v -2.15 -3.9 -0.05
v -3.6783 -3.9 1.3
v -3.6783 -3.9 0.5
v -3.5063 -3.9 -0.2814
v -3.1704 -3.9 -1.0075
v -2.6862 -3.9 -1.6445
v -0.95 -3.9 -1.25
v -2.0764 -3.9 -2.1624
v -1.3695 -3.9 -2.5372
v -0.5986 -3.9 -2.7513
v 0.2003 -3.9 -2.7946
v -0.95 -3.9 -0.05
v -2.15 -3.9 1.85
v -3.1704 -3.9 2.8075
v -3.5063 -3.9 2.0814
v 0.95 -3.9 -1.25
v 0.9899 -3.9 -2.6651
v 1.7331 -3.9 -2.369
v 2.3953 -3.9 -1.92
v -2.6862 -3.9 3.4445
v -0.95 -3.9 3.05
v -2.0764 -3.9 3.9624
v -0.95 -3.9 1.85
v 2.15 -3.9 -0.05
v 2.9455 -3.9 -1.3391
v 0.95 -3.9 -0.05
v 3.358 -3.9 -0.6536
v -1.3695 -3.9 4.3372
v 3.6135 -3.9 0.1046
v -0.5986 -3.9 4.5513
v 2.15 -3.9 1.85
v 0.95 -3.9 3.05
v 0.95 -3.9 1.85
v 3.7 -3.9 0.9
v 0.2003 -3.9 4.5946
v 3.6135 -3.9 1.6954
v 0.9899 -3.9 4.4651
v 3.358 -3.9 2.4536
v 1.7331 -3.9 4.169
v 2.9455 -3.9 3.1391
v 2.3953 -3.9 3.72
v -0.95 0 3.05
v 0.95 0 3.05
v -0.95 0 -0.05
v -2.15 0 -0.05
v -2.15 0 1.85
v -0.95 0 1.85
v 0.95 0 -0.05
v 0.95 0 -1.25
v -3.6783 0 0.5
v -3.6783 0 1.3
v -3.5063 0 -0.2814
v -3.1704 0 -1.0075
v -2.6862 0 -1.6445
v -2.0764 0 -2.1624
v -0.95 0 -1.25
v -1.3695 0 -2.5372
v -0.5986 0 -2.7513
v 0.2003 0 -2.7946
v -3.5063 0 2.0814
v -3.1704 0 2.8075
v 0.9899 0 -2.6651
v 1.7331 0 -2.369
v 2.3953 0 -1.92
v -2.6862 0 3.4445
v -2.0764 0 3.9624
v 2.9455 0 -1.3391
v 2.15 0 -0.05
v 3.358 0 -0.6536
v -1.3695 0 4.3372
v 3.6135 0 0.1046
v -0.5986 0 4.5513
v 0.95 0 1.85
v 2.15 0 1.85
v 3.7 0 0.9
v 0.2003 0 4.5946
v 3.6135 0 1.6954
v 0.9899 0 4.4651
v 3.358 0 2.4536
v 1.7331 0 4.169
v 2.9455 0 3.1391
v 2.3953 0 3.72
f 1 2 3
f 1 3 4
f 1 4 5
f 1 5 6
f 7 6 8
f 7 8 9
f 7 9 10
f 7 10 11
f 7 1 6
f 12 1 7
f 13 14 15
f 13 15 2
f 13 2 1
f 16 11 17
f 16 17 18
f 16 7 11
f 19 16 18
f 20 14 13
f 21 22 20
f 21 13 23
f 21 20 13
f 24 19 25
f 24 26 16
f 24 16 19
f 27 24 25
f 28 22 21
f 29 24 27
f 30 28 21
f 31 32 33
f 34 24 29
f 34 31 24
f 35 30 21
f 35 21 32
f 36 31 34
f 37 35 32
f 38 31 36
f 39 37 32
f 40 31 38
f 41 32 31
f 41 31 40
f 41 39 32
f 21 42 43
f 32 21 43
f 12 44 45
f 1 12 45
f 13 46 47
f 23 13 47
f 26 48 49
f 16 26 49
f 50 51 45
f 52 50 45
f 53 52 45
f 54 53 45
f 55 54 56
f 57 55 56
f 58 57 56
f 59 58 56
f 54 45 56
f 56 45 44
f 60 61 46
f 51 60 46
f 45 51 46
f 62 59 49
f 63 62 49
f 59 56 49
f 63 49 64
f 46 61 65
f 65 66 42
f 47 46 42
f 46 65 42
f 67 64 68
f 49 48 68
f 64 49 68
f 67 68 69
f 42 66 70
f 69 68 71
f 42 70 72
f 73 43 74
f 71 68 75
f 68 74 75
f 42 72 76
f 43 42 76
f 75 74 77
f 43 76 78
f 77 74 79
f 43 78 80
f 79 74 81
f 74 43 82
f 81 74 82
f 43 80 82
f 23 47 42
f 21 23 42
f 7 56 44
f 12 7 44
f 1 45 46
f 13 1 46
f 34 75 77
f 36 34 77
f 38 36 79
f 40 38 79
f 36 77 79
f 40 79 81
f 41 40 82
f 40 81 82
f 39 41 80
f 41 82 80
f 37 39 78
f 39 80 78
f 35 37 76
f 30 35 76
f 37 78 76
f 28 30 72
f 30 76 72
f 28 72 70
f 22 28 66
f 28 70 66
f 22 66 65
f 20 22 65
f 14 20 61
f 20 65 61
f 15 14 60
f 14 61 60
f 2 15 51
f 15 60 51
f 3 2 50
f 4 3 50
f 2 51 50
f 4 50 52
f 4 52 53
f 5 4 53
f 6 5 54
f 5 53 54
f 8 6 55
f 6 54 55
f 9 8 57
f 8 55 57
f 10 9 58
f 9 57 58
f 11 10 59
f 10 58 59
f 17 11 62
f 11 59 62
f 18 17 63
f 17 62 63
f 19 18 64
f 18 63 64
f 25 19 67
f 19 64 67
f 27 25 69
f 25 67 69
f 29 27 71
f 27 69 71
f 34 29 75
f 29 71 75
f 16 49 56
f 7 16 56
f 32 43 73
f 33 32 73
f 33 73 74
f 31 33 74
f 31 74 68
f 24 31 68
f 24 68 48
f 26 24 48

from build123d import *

# Parameters (mm, degrees)
F0_R     = 3.7
F1_DEPTH = 3.9


with BuildPart() as f1:
    # F0 (on Front) → F1 (new body)
    with BuildSketch(Plane.XZ):
        with Locations((0, 0.9)):
            Circle(F0_R)
        Polygon((-0.95, 3.05), (0, 3.05), (0.95, 3.05), (0.95, 1.85), (2.15, 1.85), (2.15, -0.05), (0.95, -0.05), (0.95, -1.25), (-0.95, -1.25), (-0.95, -0.05), (-2.15, -0.05), (-2.15, 1.85), (-0.95, 1.85), align=None, mode=Mode.SUBTRACT)
    extrude(amount=F1_DEPTH)


solid = f1.part
